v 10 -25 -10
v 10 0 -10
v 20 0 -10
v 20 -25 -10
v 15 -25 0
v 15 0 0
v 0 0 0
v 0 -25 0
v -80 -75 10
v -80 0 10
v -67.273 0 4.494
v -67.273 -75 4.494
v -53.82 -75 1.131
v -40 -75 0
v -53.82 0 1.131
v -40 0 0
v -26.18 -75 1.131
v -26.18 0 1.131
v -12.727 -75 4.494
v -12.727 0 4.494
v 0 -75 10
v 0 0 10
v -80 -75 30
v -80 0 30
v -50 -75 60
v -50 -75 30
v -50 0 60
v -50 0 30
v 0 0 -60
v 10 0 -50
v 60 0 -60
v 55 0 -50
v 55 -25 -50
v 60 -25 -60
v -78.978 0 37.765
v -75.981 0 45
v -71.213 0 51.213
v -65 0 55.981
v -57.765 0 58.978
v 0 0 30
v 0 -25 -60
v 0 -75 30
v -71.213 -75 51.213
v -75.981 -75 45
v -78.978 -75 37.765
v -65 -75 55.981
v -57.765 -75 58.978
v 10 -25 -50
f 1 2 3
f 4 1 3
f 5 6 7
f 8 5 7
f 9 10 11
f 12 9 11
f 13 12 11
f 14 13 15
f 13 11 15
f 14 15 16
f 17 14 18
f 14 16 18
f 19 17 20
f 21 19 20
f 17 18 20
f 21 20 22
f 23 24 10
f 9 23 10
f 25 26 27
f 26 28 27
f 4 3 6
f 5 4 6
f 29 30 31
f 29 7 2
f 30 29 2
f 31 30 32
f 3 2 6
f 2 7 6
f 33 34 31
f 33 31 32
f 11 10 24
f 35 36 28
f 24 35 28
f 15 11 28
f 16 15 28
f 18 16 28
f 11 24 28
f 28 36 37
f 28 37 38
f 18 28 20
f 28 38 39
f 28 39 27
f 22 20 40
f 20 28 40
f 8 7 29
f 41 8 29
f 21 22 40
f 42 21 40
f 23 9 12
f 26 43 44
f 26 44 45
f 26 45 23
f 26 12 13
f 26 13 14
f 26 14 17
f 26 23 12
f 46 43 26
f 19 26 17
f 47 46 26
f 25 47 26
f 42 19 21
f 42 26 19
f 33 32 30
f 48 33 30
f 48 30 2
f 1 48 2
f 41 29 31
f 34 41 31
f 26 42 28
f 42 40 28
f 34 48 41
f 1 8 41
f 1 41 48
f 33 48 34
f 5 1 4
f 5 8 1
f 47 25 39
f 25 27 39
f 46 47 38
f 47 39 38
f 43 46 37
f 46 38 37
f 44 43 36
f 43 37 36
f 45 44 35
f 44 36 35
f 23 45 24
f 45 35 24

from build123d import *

# Parameters (mm, degrees)
F2_DEPTH = 50
F3_DEPTH = 25
F4_DEPTH = 25


with BuildPart() as f2:
    # F1 (on Front) → F2 (new body)
    with BuildSketch(Plane.XZ):
        with BuildLine():
            Line((0, 30), (-50, 30))
            Line((-50, 30), (-50, 60))
            ThreePointArc((-50, 60), (-71.213203, 51.213203), (-80, 30))
            Line((-80, 30), (-80, 10))
            ThreePointArc((-80, 10), (-40, 0), (0, 10))
            Line((0, 10), (0, 30))
        make_face()
    extrude(amount=F2_DEPTH)

    # F2_face (on face) → F4 (join)
    with BuildSketch(Plane(origin=(-45.644437, -50, 22.98515), x_dir=(1, 0, 0), z_dir=(0, -1, 0))):
        with BuildLine():
            Line((45.644437, -12.98515), (45.644437, 7.01485))
            Line((45.644437, 7.01485), (-4.355563, 7.01485))
            Line((-4.355563, 7.01485), (-4.355563, 37.01485))
            ThreePointArc((-4.355563, 37.01485), (-25.568766, 28.228053), (-34.355563, 7.01485))
            Line((-34.355563, 7.01485), (-34.355563, -12.98515))
            ThreePointArc((-34.355563, -12.98515), (5.644437, -22.98515), (45.644437, -12.98515))
        make_face()
    extrude(amount=F4_DEPTH)


with BuildPart() as f3:
    # F0 (on Front) → F3 (new body)
    with BuildSketch(Plane.XZ):
        Polygon((15, 0), (0, 0), (0, -60), (60, -60), (55, -50), (10, -50), (10, -10), (20, -10), align=None)
    extrude(amount=F3_DEPTH)


solid = Compound([f2.part, f3.part])
